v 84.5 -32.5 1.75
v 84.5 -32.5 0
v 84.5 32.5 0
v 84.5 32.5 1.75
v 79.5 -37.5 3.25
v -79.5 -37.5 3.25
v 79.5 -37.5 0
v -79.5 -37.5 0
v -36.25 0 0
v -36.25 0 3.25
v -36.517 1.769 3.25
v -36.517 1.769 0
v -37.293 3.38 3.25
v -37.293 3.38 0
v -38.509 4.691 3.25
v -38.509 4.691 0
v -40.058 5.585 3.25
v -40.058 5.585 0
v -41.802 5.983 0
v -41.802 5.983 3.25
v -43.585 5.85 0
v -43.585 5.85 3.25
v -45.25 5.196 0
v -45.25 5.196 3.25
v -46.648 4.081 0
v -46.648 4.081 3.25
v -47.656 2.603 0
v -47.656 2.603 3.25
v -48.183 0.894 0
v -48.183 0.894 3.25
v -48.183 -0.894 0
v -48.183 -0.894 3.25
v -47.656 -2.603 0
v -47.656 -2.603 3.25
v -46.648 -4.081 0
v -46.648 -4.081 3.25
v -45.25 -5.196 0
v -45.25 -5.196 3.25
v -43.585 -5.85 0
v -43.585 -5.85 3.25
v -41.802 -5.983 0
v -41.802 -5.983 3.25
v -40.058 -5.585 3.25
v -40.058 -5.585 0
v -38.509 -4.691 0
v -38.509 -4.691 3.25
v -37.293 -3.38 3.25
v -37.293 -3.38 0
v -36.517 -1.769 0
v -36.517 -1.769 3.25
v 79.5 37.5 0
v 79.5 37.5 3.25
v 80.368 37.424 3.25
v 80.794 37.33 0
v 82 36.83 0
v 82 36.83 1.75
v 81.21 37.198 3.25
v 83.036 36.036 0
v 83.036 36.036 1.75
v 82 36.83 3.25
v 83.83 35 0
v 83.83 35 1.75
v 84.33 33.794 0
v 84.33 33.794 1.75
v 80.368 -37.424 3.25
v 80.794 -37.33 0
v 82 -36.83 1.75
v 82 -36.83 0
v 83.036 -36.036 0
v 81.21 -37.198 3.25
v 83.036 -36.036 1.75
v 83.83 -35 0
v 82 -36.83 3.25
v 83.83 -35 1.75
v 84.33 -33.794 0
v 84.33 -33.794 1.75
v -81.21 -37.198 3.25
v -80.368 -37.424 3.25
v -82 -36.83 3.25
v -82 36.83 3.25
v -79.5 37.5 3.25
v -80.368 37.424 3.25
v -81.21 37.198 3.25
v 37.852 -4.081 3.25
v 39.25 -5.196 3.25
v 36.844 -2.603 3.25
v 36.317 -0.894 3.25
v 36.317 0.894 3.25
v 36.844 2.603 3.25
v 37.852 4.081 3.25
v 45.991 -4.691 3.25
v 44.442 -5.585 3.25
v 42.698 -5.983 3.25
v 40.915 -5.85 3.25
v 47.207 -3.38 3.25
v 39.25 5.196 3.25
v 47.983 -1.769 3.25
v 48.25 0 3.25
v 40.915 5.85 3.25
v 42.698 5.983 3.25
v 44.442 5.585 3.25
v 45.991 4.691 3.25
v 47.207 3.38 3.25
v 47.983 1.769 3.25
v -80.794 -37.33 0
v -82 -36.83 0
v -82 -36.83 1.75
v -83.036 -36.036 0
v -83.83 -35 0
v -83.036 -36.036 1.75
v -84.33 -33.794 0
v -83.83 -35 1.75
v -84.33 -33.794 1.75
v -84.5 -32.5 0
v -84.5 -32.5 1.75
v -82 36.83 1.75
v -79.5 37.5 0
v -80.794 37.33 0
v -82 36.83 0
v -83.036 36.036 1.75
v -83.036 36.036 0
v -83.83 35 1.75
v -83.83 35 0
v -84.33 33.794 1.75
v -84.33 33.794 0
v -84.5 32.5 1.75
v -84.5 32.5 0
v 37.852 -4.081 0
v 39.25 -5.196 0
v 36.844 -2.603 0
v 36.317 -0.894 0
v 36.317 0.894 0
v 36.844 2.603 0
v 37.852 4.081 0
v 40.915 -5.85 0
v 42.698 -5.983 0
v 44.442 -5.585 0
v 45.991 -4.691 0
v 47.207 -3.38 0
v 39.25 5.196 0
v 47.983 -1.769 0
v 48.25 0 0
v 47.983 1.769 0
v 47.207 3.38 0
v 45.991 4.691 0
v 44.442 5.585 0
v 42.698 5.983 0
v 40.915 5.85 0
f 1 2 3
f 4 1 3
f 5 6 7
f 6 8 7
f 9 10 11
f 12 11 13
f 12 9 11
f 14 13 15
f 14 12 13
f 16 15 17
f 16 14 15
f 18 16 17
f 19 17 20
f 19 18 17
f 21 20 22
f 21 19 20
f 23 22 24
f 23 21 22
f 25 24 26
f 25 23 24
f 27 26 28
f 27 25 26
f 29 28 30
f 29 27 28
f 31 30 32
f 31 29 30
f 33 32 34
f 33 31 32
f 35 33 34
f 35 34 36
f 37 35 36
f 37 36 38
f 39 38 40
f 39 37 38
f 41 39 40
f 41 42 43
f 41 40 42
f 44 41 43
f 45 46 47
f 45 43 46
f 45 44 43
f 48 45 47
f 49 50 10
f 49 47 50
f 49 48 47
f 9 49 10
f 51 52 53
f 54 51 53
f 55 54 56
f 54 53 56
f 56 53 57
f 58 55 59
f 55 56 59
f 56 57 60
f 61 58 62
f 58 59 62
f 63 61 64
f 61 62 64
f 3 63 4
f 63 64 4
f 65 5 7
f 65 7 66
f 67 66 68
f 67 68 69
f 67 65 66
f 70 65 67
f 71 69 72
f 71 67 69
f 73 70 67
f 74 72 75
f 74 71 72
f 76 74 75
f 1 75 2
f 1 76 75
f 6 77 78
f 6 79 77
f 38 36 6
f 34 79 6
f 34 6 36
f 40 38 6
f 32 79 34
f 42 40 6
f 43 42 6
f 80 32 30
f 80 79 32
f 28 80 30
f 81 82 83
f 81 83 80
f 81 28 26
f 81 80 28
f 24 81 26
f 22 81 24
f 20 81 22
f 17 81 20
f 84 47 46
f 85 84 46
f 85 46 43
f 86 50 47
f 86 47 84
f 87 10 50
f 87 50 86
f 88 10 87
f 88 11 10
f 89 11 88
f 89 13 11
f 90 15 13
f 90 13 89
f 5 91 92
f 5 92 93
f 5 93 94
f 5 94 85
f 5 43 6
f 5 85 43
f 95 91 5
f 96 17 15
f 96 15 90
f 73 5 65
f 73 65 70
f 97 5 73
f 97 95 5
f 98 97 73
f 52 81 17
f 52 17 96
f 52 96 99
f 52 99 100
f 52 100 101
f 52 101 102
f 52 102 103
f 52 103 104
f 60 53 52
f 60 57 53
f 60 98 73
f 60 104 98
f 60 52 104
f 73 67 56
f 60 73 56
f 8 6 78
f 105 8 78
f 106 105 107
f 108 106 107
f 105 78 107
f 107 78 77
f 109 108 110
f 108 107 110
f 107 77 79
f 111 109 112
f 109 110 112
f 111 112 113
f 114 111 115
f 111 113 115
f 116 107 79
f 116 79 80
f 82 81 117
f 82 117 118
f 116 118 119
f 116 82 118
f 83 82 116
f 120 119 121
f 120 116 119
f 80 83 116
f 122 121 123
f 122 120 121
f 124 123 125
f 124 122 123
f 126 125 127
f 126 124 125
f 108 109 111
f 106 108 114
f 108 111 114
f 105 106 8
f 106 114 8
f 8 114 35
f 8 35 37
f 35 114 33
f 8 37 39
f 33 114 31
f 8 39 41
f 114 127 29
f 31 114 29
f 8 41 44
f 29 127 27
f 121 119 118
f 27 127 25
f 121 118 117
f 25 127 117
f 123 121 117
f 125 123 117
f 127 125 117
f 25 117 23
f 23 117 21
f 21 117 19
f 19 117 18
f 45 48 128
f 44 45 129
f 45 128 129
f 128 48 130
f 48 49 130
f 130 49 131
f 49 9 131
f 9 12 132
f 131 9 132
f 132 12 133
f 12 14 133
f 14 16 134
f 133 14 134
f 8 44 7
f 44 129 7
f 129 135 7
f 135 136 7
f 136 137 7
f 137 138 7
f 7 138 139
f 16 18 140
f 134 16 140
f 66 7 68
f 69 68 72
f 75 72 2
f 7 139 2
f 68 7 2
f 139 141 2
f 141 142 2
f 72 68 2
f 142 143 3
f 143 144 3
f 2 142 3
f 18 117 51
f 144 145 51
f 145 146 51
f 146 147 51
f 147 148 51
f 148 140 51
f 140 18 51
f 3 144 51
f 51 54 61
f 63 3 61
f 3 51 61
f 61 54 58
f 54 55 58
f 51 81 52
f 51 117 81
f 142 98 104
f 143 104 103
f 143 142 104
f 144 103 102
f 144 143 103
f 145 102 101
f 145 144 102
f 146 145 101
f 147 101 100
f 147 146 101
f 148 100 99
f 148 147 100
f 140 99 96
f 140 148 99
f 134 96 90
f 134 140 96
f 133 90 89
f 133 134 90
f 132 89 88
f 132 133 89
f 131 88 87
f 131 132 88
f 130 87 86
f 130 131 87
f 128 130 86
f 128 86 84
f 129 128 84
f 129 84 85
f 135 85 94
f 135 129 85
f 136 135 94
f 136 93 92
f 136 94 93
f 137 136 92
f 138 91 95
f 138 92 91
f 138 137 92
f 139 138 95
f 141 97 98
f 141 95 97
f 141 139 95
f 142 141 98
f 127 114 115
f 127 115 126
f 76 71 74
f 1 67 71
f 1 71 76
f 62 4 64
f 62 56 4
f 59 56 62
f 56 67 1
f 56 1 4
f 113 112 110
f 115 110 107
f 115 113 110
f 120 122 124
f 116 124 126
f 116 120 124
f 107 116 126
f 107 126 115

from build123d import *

# Parameters (mm, degrees)
F0_W     = 169
F0_H     = 75
F0_R     = 6
F1_DEPTH = 1.75
F2_W     = 164
F2_H     = 75
F3_DEPTH = 1.5
F4_R     = 5
F5_DEPTH = 25


with BuildPart() as f1:
    # F0 (on Top) → F1 (new body)
    with BuildSketch(Plane.XY):
        Rectangle(F0_W, F0_H)
        with Locations((-42.25, 0)):
            Circle(F0_R, mode=Mode.SUBTRACT)
        with Locations((42.25, 0)):
            Circle(F0_R, mode=Mode.SUBTRACT)
    extrude(amount=F1_DEPTH)

    # F2 (on face) → F3 (join)
    with BuildSketch(Plane.XY.offset(1.75)):
        Rectangle(F2_W, F2_H)
    extrude(amount=F3_DEPTH)

    # F4
    f4_edges = [f1.edges().sort_by_distance(p)[0] for p in [
        (-84.5, -37.5, 0.875),
        (84.5, -37.5, 0.875),
        (84.5, 37.5, 0.875),
        (-84.5, 37.5, 0.875),
    ]]
    fillet(f4_edges, radius=F4_R)

    # F0 (on Top) → F5 (cut)
    with BuildSketch(Plane.XY):
        with Locations((42.25, 0)):
            Circle(F0_R)
        with Locations((-42.25, 0)):
            Circle(F0_R)
    extrude(amount=F5_DEPTH, mode=Mode.SUBTRACT)


solid = f1.part
